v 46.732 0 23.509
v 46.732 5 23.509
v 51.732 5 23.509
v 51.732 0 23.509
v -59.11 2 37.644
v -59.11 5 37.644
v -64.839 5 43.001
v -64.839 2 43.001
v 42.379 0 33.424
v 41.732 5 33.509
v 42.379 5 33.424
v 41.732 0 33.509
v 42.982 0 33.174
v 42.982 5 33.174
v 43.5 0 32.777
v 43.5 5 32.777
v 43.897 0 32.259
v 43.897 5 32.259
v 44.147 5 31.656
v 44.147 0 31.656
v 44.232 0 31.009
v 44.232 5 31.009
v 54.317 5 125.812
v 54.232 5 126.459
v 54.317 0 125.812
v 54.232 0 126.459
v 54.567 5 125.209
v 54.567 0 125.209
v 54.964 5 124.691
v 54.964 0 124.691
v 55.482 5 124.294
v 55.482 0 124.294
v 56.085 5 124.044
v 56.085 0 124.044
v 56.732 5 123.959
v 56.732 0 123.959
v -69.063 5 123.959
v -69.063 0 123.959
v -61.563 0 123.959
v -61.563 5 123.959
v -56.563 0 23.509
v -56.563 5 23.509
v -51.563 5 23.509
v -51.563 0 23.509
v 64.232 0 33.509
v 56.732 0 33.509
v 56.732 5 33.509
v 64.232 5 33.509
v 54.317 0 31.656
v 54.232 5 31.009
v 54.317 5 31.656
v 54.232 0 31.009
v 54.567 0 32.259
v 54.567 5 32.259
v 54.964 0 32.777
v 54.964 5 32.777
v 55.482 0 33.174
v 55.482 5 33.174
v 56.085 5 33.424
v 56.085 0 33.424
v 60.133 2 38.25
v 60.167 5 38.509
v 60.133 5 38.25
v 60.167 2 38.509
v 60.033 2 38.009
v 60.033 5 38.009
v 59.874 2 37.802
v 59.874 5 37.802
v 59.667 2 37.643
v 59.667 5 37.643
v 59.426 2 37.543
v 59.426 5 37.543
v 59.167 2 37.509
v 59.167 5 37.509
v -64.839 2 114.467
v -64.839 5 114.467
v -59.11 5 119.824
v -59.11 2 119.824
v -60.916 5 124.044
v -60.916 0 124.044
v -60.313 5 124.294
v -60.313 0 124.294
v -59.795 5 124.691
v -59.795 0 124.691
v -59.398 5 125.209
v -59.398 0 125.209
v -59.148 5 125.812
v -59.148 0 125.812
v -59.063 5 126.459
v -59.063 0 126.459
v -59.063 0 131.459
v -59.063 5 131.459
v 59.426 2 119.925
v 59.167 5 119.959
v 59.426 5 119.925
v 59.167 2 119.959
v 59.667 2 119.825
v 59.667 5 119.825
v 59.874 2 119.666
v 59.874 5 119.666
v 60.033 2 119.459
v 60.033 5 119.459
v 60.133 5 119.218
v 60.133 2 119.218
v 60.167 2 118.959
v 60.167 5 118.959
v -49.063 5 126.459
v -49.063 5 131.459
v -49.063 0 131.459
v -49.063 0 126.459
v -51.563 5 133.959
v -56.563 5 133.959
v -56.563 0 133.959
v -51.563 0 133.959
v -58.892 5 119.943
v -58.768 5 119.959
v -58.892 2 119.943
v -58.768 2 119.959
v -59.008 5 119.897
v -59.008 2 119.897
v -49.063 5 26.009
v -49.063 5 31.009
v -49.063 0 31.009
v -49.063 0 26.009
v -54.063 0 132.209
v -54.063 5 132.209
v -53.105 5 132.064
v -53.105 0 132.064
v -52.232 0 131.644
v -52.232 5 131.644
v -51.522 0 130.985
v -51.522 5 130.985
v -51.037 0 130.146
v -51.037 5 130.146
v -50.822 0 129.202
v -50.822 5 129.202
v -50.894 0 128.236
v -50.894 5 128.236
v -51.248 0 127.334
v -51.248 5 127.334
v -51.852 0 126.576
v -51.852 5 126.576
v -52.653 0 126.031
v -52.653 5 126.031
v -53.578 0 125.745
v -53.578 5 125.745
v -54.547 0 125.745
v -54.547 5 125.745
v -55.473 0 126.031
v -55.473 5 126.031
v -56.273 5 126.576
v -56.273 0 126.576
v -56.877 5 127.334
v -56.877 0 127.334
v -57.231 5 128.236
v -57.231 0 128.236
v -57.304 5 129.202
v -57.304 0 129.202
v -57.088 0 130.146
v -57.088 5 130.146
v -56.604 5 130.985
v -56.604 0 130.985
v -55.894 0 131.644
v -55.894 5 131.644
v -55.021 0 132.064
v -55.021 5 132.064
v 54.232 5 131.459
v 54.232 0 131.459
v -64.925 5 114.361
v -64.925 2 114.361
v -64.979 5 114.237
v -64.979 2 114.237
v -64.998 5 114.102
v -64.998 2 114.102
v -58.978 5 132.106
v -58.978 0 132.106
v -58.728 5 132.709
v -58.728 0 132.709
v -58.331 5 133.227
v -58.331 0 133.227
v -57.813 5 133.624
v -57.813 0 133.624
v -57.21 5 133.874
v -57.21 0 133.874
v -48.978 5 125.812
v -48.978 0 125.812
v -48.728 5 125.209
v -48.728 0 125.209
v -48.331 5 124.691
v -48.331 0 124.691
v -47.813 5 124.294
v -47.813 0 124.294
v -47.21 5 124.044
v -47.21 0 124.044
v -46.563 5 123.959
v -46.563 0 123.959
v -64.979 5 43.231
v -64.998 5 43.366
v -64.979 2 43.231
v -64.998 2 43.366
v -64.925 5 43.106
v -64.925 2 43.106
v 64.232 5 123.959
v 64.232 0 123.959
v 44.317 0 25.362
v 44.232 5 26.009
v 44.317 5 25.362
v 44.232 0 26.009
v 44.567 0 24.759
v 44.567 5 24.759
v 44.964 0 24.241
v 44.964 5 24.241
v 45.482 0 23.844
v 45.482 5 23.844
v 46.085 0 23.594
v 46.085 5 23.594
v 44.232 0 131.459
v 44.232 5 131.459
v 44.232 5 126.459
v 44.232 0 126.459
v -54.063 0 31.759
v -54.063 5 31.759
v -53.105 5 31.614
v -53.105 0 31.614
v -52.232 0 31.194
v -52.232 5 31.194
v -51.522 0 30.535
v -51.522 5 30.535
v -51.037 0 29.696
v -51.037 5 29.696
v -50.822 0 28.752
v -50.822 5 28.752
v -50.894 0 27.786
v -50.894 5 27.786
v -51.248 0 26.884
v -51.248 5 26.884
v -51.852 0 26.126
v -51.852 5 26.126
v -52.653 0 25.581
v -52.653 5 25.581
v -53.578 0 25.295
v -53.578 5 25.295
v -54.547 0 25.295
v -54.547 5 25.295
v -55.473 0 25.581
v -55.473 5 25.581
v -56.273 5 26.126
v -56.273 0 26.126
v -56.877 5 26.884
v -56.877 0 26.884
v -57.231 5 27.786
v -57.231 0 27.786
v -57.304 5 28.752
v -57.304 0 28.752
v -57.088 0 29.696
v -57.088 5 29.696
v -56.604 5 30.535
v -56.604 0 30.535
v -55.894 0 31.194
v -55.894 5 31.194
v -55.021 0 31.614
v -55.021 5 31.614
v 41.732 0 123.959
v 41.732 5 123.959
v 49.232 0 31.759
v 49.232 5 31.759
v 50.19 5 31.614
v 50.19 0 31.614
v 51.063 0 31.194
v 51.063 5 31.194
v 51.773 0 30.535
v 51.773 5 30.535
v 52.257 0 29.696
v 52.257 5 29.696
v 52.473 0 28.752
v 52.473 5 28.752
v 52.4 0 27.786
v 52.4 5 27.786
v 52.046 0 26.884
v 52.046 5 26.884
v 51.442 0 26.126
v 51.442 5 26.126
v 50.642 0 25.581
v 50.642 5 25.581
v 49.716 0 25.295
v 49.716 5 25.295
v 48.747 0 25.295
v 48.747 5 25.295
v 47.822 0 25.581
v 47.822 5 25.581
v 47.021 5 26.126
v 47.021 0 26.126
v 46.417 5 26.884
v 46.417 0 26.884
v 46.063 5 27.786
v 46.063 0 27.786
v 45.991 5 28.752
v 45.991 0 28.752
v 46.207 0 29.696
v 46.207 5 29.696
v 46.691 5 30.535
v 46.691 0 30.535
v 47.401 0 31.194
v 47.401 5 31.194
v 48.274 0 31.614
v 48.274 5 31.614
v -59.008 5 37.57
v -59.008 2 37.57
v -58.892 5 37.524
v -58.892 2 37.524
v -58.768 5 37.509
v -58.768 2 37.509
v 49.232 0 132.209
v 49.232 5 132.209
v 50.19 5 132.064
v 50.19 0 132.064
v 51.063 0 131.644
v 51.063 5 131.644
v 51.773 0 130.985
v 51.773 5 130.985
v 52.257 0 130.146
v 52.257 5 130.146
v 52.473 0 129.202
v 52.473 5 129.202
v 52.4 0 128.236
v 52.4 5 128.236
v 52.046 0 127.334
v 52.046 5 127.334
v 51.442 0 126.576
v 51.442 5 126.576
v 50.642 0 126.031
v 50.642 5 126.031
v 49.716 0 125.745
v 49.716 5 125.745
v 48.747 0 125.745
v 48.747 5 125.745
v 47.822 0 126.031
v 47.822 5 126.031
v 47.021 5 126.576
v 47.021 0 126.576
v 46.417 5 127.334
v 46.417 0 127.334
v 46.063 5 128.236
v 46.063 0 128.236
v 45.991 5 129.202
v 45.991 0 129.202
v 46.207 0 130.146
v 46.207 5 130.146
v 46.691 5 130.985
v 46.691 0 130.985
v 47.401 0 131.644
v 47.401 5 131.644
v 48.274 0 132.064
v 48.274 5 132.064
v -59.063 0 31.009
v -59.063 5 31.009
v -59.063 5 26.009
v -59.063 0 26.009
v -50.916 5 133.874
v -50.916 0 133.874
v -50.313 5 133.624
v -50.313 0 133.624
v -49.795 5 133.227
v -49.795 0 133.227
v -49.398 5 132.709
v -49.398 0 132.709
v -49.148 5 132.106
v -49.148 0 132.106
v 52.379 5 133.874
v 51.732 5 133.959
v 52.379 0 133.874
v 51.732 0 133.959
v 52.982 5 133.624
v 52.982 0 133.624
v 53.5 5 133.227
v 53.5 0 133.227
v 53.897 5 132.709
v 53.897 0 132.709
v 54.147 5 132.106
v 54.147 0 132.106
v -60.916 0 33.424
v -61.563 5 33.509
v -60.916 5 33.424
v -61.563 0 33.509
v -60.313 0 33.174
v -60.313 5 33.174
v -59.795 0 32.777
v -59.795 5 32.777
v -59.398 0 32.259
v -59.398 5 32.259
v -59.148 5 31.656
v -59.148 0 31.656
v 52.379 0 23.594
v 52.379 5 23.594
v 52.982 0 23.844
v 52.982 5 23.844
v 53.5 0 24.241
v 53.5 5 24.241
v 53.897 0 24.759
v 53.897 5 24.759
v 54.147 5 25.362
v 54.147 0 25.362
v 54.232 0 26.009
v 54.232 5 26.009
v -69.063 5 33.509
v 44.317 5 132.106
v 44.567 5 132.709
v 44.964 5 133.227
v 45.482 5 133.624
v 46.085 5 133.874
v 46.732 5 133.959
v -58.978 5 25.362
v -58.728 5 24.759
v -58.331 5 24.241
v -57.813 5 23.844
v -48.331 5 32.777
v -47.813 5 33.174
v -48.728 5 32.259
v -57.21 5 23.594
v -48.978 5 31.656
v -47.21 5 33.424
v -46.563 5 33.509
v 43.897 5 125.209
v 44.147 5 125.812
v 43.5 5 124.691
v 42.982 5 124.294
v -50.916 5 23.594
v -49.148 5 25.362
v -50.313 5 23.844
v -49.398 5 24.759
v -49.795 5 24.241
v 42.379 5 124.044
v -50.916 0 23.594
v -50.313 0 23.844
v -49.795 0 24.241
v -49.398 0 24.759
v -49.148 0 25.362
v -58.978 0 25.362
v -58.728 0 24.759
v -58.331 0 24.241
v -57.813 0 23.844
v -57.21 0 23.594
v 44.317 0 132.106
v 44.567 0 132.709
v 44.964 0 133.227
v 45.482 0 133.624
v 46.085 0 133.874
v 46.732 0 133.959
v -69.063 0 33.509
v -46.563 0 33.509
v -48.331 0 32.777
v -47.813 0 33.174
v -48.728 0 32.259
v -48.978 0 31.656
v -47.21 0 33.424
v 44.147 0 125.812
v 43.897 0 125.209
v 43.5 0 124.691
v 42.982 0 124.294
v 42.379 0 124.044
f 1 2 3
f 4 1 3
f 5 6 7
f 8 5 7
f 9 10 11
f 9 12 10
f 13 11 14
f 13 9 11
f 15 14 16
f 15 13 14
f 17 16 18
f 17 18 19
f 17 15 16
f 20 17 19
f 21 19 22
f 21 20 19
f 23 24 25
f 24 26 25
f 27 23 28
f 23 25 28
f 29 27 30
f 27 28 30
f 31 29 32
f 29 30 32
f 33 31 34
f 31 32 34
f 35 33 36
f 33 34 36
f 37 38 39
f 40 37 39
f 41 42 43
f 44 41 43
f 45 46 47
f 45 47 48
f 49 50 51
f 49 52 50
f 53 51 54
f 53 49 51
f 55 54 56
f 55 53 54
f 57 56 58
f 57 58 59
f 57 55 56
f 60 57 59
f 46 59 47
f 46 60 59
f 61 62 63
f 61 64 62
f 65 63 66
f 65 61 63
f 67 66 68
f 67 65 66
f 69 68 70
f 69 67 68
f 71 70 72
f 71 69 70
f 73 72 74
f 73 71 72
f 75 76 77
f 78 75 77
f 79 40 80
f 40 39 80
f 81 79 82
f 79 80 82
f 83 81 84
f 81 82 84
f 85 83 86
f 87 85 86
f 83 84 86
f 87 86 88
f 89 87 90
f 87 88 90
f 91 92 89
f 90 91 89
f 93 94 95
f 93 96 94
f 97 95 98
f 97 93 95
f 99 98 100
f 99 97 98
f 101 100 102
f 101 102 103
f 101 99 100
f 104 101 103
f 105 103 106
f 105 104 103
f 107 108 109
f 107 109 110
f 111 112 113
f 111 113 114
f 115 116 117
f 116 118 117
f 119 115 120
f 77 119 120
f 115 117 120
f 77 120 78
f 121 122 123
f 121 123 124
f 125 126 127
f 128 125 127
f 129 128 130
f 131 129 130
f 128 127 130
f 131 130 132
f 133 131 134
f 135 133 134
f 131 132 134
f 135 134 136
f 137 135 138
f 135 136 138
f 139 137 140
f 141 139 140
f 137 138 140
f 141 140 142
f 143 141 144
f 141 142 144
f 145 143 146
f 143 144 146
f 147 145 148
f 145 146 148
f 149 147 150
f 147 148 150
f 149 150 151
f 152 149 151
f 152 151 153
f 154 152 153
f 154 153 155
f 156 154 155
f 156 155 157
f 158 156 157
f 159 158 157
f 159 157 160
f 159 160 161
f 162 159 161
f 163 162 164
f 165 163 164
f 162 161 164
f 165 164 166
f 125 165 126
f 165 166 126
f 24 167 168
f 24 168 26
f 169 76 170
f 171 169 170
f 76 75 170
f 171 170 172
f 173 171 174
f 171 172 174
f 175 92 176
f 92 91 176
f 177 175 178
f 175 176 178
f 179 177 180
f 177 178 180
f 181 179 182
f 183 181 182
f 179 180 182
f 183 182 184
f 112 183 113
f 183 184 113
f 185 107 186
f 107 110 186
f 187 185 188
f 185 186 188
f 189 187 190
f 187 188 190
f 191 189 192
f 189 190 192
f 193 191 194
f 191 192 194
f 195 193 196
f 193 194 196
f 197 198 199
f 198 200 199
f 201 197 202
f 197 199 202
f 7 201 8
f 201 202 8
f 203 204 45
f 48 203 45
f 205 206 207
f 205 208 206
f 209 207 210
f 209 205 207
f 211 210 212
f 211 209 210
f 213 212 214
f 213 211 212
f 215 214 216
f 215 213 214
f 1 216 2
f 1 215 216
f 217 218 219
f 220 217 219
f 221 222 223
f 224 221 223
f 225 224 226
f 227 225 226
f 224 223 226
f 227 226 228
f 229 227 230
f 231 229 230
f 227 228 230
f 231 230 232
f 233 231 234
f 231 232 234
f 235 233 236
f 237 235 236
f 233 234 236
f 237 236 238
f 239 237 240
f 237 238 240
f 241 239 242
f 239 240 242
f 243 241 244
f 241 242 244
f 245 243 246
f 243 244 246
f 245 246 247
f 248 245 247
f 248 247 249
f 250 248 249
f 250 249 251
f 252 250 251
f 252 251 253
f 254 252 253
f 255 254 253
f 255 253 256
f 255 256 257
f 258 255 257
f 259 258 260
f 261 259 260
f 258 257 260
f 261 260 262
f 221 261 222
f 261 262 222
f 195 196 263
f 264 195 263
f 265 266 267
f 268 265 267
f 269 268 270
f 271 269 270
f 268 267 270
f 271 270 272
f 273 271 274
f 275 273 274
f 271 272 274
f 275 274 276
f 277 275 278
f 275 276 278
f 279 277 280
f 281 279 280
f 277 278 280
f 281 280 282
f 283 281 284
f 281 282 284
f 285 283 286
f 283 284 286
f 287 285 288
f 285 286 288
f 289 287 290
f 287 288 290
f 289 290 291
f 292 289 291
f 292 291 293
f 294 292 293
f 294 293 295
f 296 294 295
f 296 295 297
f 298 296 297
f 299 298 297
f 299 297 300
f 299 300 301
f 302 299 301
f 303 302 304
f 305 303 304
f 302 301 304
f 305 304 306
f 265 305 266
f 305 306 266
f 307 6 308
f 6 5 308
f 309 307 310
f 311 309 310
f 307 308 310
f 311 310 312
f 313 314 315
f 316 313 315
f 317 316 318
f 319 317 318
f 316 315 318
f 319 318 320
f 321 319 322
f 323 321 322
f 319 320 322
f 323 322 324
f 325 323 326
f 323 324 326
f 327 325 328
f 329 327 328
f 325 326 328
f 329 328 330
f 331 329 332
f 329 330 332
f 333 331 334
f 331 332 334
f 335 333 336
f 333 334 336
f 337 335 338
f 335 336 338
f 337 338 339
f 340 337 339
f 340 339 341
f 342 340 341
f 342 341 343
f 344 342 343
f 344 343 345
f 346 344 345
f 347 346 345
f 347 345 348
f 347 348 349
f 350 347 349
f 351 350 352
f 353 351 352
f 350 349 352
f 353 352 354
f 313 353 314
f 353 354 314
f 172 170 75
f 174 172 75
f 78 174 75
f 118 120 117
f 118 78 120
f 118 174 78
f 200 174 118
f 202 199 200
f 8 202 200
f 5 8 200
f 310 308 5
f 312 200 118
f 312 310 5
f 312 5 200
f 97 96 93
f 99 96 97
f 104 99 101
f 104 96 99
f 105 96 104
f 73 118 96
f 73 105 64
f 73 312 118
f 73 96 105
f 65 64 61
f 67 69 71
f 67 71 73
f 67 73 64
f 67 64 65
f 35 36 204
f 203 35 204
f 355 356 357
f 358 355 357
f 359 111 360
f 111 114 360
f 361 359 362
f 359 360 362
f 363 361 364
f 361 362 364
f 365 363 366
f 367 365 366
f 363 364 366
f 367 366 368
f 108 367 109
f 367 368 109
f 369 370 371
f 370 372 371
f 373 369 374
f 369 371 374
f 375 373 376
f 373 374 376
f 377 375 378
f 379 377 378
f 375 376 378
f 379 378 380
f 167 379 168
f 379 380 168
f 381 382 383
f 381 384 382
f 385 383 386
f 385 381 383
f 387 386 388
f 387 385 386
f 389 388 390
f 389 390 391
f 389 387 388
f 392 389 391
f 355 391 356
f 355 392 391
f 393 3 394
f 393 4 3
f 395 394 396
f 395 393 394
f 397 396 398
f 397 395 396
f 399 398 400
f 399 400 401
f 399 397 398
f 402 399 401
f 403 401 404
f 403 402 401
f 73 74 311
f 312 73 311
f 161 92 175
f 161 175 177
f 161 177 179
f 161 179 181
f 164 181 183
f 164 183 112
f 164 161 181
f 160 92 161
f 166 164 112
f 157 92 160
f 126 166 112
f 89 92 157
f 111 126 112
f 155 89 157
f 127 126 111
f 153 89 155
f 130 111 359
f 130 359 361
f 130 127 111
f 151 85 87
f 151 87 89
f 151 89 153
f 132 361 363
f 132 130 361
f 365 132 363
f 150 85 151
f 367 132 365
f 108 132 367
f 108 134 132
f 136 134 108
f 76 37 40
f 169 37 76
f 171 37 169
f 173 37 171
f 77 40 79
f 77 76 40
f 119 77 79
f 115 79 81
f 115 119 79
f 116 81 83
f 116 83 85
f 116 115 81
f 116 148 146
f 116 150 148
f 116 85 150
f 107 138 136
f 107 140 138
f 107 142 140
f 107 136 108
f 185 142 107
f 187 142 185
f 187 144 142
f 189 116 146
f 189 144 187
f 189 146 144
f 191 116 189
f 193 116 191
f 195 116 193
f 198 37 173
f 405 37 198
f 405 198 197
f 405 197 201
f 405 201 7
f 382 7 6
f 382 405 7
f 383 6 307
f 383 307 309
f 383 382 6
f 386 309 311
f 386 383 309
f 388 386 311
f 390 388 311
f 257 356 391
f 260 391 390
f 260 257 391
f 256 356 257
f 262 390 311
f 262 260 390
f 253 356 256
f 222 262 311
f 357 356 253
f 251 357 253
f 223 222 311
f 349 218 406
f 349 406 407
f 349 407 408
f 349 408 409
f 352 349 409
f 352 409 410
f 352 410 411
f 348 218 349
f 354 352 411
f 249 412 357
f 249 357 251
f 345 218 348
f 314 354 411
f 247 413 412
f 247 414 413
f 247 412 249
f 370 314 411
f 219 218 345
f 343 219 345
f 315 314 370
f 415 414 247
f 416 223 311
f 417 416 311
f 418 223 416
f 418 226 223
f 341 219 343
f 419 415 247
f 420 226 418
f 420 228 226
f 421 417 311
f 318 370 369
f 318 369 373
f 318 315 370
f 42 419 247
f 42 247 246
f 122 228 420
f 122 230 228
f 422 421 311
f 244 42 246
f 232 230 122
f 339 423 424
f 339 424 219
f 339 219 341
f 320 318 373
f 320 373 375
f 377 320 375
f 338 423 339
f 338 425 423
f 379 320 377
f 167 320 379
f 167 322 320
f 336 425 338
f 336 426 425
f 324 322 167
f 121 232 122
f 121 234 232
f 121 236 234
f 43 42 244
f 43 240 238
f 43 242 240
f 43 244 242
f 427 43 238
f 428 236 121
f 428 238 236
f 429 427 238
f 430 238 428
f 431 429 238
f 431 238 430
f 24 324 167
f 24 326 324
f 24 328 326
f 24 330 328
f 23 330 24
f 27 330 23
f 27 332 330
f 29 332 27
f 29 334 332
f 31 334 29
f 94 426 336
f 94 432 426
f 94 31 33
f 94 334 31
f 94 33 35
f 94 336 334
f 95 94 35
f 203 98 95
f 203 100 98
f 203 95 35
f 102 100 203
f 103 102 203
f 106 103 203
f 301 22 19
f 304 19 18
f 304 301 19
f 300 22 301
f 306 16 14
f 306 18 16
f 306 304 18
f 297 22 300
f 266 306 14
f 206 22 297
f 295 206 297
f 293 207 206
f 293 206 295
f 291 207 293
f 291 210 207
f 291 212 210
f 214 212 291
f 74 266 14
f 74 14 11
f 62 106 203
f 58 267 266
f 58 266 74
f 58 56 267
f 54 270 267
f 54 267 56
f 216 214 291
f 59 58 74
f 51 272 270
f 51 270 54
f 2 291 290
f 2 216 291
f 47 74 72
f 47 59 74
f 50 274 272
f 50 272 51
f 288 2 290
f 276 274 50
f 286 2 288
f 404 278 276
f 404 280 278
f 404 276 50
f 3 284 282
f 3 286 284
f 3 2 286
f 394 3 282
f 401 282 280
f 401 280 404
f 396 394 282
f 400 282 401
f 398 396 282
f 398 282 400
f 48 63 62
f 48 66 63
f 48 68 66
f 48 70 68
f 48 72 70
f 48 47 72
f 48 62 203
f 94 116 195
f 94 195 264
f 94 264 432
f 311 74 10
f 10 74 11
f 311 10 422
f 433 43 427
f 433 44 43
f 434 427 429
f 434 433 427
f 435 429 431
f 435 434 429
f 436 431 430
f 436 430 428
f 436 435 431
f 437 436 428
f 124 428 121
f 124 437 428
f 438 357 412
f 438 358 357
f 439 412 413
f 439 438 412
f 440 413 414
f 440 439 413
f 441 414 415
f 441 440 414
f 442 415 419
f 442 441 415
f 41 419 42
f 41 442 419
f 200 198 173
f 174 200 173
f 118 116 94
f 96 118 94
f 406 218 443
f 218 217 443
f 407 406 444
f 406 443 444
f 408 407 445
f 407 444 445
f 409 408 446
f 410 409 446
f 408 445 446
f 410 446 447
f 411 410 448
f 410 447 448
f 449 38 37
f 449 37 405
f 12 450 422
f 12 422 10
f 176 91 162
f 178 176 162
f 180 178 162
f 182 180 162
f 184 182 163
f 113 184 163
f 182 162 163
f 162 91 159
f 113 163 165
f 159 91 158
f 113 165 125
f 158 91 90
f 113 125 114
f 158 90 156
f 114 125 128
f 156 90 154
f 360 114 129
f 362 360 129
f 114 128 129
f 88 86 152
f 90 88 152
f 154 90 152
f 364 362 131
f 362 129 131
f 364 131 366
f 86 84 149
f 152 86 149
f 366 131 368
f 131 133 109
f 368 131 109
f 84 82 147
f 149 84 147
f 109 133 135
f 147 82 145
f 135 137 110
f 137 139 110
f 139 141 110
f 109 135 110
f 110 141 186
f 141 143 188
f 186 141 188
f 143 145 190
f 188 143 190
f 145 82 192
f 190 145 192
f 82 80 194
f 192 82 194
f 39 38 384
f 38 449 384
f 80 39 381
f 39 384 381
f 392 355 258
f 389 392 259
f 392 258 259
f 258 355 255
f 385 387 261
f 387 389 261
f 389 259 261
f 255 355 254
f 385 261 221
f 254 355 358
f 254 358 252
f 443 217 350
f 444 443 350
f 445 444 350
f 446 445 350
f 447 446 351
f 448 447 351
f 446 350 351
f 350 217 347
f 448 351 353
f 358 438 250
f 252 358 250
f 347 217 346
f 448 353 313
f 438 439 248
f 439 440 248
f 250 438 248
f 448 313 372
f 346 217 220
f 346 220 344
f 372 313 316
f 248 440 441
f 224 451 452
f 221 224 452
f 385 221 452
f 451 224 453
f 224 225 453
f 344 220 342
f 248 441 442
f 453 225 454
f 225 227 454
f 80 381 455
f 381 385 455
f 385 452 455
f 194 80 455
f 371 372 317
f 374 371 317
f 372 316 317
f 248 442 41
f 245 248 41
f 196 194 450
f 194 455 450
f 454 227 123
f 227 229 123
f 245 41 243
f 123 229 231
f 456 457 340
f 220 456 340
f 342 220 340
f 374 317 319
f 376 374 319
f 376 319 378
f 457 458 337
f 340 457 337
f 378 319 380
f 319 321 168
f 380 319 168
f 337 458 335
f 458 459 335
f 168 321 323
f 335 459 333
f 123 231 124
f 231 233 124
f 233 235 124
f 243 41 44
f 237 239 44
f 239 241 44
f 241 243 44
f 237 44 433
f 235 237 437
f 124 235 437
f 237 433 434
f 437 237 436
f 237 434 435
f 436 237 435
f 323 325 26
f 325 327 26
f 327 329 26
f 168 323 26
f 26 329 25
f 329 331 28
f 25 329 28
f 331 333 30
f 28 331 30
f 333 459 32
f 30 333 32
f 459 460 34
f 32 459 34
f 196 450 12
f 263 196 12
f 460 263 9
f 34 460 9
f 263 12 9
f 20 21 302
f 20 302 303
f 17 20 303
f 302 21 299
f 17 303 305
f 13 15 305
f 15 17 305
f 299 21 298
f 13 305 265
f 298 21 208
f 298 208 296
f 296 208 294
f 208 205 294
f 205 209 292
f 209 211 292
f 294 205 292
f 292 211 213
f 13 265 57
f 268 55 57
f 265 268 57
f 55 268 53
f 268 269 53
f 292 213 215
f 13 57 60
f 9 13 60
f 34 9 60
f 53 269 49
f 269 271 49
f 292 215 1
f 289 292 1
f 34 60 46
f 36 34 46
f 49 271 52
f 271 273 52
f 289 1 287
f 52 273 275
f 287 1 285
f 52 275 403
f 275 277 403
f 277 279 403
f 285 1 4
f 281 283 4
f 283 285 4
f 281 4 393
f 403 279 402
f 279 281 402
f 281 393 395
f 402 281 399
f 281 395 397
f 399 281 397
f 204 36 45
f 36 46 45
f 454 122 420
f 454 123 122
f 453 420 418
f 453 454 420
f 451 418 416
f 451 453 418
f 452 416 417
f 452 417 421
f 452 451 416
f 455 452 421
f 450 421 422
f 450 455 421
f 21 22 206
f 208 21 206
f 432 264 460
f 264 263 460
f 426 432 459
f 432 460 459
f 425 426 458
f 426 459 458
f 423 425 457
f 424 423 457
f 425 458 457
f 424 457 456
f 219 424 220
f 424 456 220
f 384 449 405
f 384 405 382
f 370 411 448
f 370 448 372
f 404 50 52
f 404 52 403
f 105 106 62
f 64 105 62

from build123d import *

# Parameters (mm, degrees)
SKETCH1_W           = 133.2946
SKETCH1_H           = 90.45
BOSS_EXTRUDE1_DEPTH = 5
SKETCH2_W           = 10
SKETCH2_H           = 10
BOSS_EXTRUDE2_DEPTH = 5
SKETCH4_R           = 3.25
CUT_EXTRUDE1_DEPTH  = 5
FILLET1_R           = 2.5
CUT_EXTRUDE2_DEPTH  = 3
FILLET2_R           = 1
FILLET3_R           = 0.5


with BuildPart() as part:
    # Sketch1 → Boss-Extrude1 (new body)
    with BuildSketch(Plane(origin=(0, 0, 0), x_dir=(1, 0, 0), z_dir=(0, 1, 0))):
        with Locations((-2.415435148, -78.733798602)):
            Rectangle(SKETCH1_W, SKETCH1_H)
    extrude(amount=BOSS_EXTRUDE1_DEPTH)

    # Sketch2 → Boss-Extrude2 (add)
    with BuildSketch(Plane(origin=(0, 5, 0), x_dir=(1, 0, 0), z_dir=(0, 1, 0))):
        with Locations((-54.062735148, -28.508798602)):
            Rectangle(SKETCH2_W, SKETCH2_H)
        with Locations((49.231864852, -28.508798602)):
            Rectangle(SKETCH2_W, SKETCH2_H)
        with Locations((49.231864852, -128.958798602)):
            Rectangle(SKETCH2_W, SKETCH2_H)
        with Locations((-54.062735148, -128.958798602)):
            Rectangle(SKETCH2_W, SKETCH2_H)
    extrude(amount=-BOSS_EXTRUDE2_DEPTH)

    # Sketch4 → Cut-Extrude1 (cut)
    with BuildSketch(Plane(origin=(0, 5, 0), x_dir=(1, 0, 0), z_dir=(0, 1, 0))):
        with Locations((49.231864852, -28.508798602)):
            Circle(SKETCH4_R)
        with Locations((-54.062735148, -28.508798602)):
            Circle(SKETCH4_R)
        with Locations((-54.062735148, -128.958798602)):
            Circle(SKETCH4_R)
        with Locations((49.231864852, -128.958798602)):
            Circle(SKETCH4_R)
    extrude(amount=-CUT_EXTRUDE1_DEPTH, mode=Mode.SUBTRACT)

    # Fillet1
    fillet1_edges = [part.edges().sort_by_distance(p)[0] for p in [
        (-59.062735148, 2.5, 33.508798602),
        (-59.062735148, 2.5, 23.508798602),
        (-49.062735148, 2.5, 23.508798602),
        (-49.062735148, 2.5, 33.508798602),
        (44.231864852, 2.5, 33.508798602),
        (44.231864852, 2.5, 23.508798602),
        (54.231864852, 2.5, 23.508798602),
        (54.231864852, 2.5, 33.508798602),
        (54.231864852, 2.5, 123.958798602),
        (54.231864852, 2.5, 133.958798602),
        (44.231864852, 2.5, 133.958798602),
        (44.231864852, 2.5, 123.958798602),
        (-49.062735148, 2.5, 123.958798602),
        (-49.062735148, 2.5, 133.958798602),
        (-59.062735148, 2.5, 133.958798602),
        (-59.062735148, 2.5, 123.958798602),
    ]]
    fillet(fillet1_edges, radius=FILLET1_R)

    # Sketch6 → Cut-Extrude2 (cut)
    with BuildSketch(Plane(origin=(0, 5, 0), x_dir=(1, 0, 0), z_dir=(0, 1, 0))):
        Polygon((-58.965485148, -119.958798602), (60.166814852, -119.958798602), (60.166814852, -37.508798602), (-58.965485148, -37.508798602), (-64.997685148, -43.148798602), (-64.997685148, -114.318798602), align=None)
    extrude(amount=-CUT_EXTRUDE2_DEPTH, mode=Mode.SUBTRACT)

    # Fillet2
    fillet2_edges = [part.edges().sort_by_distance(p)[0] for p in [
        (60.166814852, 3.5, 37.508798602),
        (60.166814852, 3.5, 119.958798602),
    ]]
    fillet(fillet2_edges, radius=FILLET2_R)

    # Fillet3
    fillet3_edges = [part.edges().sort_by_distance(p)[0] for p in [
        (-58.965485148, 3.5, 37.508798602),
        (-64.997685148, 3.5, 43.148798602),
        (-64.997685148, 3.5, 114.318798602),
        (-58.965485148, 3.5, 119.958798602),
    ]]
    fillet(fillet3_edges, radius=FILLET3_R)


solid = part.part
